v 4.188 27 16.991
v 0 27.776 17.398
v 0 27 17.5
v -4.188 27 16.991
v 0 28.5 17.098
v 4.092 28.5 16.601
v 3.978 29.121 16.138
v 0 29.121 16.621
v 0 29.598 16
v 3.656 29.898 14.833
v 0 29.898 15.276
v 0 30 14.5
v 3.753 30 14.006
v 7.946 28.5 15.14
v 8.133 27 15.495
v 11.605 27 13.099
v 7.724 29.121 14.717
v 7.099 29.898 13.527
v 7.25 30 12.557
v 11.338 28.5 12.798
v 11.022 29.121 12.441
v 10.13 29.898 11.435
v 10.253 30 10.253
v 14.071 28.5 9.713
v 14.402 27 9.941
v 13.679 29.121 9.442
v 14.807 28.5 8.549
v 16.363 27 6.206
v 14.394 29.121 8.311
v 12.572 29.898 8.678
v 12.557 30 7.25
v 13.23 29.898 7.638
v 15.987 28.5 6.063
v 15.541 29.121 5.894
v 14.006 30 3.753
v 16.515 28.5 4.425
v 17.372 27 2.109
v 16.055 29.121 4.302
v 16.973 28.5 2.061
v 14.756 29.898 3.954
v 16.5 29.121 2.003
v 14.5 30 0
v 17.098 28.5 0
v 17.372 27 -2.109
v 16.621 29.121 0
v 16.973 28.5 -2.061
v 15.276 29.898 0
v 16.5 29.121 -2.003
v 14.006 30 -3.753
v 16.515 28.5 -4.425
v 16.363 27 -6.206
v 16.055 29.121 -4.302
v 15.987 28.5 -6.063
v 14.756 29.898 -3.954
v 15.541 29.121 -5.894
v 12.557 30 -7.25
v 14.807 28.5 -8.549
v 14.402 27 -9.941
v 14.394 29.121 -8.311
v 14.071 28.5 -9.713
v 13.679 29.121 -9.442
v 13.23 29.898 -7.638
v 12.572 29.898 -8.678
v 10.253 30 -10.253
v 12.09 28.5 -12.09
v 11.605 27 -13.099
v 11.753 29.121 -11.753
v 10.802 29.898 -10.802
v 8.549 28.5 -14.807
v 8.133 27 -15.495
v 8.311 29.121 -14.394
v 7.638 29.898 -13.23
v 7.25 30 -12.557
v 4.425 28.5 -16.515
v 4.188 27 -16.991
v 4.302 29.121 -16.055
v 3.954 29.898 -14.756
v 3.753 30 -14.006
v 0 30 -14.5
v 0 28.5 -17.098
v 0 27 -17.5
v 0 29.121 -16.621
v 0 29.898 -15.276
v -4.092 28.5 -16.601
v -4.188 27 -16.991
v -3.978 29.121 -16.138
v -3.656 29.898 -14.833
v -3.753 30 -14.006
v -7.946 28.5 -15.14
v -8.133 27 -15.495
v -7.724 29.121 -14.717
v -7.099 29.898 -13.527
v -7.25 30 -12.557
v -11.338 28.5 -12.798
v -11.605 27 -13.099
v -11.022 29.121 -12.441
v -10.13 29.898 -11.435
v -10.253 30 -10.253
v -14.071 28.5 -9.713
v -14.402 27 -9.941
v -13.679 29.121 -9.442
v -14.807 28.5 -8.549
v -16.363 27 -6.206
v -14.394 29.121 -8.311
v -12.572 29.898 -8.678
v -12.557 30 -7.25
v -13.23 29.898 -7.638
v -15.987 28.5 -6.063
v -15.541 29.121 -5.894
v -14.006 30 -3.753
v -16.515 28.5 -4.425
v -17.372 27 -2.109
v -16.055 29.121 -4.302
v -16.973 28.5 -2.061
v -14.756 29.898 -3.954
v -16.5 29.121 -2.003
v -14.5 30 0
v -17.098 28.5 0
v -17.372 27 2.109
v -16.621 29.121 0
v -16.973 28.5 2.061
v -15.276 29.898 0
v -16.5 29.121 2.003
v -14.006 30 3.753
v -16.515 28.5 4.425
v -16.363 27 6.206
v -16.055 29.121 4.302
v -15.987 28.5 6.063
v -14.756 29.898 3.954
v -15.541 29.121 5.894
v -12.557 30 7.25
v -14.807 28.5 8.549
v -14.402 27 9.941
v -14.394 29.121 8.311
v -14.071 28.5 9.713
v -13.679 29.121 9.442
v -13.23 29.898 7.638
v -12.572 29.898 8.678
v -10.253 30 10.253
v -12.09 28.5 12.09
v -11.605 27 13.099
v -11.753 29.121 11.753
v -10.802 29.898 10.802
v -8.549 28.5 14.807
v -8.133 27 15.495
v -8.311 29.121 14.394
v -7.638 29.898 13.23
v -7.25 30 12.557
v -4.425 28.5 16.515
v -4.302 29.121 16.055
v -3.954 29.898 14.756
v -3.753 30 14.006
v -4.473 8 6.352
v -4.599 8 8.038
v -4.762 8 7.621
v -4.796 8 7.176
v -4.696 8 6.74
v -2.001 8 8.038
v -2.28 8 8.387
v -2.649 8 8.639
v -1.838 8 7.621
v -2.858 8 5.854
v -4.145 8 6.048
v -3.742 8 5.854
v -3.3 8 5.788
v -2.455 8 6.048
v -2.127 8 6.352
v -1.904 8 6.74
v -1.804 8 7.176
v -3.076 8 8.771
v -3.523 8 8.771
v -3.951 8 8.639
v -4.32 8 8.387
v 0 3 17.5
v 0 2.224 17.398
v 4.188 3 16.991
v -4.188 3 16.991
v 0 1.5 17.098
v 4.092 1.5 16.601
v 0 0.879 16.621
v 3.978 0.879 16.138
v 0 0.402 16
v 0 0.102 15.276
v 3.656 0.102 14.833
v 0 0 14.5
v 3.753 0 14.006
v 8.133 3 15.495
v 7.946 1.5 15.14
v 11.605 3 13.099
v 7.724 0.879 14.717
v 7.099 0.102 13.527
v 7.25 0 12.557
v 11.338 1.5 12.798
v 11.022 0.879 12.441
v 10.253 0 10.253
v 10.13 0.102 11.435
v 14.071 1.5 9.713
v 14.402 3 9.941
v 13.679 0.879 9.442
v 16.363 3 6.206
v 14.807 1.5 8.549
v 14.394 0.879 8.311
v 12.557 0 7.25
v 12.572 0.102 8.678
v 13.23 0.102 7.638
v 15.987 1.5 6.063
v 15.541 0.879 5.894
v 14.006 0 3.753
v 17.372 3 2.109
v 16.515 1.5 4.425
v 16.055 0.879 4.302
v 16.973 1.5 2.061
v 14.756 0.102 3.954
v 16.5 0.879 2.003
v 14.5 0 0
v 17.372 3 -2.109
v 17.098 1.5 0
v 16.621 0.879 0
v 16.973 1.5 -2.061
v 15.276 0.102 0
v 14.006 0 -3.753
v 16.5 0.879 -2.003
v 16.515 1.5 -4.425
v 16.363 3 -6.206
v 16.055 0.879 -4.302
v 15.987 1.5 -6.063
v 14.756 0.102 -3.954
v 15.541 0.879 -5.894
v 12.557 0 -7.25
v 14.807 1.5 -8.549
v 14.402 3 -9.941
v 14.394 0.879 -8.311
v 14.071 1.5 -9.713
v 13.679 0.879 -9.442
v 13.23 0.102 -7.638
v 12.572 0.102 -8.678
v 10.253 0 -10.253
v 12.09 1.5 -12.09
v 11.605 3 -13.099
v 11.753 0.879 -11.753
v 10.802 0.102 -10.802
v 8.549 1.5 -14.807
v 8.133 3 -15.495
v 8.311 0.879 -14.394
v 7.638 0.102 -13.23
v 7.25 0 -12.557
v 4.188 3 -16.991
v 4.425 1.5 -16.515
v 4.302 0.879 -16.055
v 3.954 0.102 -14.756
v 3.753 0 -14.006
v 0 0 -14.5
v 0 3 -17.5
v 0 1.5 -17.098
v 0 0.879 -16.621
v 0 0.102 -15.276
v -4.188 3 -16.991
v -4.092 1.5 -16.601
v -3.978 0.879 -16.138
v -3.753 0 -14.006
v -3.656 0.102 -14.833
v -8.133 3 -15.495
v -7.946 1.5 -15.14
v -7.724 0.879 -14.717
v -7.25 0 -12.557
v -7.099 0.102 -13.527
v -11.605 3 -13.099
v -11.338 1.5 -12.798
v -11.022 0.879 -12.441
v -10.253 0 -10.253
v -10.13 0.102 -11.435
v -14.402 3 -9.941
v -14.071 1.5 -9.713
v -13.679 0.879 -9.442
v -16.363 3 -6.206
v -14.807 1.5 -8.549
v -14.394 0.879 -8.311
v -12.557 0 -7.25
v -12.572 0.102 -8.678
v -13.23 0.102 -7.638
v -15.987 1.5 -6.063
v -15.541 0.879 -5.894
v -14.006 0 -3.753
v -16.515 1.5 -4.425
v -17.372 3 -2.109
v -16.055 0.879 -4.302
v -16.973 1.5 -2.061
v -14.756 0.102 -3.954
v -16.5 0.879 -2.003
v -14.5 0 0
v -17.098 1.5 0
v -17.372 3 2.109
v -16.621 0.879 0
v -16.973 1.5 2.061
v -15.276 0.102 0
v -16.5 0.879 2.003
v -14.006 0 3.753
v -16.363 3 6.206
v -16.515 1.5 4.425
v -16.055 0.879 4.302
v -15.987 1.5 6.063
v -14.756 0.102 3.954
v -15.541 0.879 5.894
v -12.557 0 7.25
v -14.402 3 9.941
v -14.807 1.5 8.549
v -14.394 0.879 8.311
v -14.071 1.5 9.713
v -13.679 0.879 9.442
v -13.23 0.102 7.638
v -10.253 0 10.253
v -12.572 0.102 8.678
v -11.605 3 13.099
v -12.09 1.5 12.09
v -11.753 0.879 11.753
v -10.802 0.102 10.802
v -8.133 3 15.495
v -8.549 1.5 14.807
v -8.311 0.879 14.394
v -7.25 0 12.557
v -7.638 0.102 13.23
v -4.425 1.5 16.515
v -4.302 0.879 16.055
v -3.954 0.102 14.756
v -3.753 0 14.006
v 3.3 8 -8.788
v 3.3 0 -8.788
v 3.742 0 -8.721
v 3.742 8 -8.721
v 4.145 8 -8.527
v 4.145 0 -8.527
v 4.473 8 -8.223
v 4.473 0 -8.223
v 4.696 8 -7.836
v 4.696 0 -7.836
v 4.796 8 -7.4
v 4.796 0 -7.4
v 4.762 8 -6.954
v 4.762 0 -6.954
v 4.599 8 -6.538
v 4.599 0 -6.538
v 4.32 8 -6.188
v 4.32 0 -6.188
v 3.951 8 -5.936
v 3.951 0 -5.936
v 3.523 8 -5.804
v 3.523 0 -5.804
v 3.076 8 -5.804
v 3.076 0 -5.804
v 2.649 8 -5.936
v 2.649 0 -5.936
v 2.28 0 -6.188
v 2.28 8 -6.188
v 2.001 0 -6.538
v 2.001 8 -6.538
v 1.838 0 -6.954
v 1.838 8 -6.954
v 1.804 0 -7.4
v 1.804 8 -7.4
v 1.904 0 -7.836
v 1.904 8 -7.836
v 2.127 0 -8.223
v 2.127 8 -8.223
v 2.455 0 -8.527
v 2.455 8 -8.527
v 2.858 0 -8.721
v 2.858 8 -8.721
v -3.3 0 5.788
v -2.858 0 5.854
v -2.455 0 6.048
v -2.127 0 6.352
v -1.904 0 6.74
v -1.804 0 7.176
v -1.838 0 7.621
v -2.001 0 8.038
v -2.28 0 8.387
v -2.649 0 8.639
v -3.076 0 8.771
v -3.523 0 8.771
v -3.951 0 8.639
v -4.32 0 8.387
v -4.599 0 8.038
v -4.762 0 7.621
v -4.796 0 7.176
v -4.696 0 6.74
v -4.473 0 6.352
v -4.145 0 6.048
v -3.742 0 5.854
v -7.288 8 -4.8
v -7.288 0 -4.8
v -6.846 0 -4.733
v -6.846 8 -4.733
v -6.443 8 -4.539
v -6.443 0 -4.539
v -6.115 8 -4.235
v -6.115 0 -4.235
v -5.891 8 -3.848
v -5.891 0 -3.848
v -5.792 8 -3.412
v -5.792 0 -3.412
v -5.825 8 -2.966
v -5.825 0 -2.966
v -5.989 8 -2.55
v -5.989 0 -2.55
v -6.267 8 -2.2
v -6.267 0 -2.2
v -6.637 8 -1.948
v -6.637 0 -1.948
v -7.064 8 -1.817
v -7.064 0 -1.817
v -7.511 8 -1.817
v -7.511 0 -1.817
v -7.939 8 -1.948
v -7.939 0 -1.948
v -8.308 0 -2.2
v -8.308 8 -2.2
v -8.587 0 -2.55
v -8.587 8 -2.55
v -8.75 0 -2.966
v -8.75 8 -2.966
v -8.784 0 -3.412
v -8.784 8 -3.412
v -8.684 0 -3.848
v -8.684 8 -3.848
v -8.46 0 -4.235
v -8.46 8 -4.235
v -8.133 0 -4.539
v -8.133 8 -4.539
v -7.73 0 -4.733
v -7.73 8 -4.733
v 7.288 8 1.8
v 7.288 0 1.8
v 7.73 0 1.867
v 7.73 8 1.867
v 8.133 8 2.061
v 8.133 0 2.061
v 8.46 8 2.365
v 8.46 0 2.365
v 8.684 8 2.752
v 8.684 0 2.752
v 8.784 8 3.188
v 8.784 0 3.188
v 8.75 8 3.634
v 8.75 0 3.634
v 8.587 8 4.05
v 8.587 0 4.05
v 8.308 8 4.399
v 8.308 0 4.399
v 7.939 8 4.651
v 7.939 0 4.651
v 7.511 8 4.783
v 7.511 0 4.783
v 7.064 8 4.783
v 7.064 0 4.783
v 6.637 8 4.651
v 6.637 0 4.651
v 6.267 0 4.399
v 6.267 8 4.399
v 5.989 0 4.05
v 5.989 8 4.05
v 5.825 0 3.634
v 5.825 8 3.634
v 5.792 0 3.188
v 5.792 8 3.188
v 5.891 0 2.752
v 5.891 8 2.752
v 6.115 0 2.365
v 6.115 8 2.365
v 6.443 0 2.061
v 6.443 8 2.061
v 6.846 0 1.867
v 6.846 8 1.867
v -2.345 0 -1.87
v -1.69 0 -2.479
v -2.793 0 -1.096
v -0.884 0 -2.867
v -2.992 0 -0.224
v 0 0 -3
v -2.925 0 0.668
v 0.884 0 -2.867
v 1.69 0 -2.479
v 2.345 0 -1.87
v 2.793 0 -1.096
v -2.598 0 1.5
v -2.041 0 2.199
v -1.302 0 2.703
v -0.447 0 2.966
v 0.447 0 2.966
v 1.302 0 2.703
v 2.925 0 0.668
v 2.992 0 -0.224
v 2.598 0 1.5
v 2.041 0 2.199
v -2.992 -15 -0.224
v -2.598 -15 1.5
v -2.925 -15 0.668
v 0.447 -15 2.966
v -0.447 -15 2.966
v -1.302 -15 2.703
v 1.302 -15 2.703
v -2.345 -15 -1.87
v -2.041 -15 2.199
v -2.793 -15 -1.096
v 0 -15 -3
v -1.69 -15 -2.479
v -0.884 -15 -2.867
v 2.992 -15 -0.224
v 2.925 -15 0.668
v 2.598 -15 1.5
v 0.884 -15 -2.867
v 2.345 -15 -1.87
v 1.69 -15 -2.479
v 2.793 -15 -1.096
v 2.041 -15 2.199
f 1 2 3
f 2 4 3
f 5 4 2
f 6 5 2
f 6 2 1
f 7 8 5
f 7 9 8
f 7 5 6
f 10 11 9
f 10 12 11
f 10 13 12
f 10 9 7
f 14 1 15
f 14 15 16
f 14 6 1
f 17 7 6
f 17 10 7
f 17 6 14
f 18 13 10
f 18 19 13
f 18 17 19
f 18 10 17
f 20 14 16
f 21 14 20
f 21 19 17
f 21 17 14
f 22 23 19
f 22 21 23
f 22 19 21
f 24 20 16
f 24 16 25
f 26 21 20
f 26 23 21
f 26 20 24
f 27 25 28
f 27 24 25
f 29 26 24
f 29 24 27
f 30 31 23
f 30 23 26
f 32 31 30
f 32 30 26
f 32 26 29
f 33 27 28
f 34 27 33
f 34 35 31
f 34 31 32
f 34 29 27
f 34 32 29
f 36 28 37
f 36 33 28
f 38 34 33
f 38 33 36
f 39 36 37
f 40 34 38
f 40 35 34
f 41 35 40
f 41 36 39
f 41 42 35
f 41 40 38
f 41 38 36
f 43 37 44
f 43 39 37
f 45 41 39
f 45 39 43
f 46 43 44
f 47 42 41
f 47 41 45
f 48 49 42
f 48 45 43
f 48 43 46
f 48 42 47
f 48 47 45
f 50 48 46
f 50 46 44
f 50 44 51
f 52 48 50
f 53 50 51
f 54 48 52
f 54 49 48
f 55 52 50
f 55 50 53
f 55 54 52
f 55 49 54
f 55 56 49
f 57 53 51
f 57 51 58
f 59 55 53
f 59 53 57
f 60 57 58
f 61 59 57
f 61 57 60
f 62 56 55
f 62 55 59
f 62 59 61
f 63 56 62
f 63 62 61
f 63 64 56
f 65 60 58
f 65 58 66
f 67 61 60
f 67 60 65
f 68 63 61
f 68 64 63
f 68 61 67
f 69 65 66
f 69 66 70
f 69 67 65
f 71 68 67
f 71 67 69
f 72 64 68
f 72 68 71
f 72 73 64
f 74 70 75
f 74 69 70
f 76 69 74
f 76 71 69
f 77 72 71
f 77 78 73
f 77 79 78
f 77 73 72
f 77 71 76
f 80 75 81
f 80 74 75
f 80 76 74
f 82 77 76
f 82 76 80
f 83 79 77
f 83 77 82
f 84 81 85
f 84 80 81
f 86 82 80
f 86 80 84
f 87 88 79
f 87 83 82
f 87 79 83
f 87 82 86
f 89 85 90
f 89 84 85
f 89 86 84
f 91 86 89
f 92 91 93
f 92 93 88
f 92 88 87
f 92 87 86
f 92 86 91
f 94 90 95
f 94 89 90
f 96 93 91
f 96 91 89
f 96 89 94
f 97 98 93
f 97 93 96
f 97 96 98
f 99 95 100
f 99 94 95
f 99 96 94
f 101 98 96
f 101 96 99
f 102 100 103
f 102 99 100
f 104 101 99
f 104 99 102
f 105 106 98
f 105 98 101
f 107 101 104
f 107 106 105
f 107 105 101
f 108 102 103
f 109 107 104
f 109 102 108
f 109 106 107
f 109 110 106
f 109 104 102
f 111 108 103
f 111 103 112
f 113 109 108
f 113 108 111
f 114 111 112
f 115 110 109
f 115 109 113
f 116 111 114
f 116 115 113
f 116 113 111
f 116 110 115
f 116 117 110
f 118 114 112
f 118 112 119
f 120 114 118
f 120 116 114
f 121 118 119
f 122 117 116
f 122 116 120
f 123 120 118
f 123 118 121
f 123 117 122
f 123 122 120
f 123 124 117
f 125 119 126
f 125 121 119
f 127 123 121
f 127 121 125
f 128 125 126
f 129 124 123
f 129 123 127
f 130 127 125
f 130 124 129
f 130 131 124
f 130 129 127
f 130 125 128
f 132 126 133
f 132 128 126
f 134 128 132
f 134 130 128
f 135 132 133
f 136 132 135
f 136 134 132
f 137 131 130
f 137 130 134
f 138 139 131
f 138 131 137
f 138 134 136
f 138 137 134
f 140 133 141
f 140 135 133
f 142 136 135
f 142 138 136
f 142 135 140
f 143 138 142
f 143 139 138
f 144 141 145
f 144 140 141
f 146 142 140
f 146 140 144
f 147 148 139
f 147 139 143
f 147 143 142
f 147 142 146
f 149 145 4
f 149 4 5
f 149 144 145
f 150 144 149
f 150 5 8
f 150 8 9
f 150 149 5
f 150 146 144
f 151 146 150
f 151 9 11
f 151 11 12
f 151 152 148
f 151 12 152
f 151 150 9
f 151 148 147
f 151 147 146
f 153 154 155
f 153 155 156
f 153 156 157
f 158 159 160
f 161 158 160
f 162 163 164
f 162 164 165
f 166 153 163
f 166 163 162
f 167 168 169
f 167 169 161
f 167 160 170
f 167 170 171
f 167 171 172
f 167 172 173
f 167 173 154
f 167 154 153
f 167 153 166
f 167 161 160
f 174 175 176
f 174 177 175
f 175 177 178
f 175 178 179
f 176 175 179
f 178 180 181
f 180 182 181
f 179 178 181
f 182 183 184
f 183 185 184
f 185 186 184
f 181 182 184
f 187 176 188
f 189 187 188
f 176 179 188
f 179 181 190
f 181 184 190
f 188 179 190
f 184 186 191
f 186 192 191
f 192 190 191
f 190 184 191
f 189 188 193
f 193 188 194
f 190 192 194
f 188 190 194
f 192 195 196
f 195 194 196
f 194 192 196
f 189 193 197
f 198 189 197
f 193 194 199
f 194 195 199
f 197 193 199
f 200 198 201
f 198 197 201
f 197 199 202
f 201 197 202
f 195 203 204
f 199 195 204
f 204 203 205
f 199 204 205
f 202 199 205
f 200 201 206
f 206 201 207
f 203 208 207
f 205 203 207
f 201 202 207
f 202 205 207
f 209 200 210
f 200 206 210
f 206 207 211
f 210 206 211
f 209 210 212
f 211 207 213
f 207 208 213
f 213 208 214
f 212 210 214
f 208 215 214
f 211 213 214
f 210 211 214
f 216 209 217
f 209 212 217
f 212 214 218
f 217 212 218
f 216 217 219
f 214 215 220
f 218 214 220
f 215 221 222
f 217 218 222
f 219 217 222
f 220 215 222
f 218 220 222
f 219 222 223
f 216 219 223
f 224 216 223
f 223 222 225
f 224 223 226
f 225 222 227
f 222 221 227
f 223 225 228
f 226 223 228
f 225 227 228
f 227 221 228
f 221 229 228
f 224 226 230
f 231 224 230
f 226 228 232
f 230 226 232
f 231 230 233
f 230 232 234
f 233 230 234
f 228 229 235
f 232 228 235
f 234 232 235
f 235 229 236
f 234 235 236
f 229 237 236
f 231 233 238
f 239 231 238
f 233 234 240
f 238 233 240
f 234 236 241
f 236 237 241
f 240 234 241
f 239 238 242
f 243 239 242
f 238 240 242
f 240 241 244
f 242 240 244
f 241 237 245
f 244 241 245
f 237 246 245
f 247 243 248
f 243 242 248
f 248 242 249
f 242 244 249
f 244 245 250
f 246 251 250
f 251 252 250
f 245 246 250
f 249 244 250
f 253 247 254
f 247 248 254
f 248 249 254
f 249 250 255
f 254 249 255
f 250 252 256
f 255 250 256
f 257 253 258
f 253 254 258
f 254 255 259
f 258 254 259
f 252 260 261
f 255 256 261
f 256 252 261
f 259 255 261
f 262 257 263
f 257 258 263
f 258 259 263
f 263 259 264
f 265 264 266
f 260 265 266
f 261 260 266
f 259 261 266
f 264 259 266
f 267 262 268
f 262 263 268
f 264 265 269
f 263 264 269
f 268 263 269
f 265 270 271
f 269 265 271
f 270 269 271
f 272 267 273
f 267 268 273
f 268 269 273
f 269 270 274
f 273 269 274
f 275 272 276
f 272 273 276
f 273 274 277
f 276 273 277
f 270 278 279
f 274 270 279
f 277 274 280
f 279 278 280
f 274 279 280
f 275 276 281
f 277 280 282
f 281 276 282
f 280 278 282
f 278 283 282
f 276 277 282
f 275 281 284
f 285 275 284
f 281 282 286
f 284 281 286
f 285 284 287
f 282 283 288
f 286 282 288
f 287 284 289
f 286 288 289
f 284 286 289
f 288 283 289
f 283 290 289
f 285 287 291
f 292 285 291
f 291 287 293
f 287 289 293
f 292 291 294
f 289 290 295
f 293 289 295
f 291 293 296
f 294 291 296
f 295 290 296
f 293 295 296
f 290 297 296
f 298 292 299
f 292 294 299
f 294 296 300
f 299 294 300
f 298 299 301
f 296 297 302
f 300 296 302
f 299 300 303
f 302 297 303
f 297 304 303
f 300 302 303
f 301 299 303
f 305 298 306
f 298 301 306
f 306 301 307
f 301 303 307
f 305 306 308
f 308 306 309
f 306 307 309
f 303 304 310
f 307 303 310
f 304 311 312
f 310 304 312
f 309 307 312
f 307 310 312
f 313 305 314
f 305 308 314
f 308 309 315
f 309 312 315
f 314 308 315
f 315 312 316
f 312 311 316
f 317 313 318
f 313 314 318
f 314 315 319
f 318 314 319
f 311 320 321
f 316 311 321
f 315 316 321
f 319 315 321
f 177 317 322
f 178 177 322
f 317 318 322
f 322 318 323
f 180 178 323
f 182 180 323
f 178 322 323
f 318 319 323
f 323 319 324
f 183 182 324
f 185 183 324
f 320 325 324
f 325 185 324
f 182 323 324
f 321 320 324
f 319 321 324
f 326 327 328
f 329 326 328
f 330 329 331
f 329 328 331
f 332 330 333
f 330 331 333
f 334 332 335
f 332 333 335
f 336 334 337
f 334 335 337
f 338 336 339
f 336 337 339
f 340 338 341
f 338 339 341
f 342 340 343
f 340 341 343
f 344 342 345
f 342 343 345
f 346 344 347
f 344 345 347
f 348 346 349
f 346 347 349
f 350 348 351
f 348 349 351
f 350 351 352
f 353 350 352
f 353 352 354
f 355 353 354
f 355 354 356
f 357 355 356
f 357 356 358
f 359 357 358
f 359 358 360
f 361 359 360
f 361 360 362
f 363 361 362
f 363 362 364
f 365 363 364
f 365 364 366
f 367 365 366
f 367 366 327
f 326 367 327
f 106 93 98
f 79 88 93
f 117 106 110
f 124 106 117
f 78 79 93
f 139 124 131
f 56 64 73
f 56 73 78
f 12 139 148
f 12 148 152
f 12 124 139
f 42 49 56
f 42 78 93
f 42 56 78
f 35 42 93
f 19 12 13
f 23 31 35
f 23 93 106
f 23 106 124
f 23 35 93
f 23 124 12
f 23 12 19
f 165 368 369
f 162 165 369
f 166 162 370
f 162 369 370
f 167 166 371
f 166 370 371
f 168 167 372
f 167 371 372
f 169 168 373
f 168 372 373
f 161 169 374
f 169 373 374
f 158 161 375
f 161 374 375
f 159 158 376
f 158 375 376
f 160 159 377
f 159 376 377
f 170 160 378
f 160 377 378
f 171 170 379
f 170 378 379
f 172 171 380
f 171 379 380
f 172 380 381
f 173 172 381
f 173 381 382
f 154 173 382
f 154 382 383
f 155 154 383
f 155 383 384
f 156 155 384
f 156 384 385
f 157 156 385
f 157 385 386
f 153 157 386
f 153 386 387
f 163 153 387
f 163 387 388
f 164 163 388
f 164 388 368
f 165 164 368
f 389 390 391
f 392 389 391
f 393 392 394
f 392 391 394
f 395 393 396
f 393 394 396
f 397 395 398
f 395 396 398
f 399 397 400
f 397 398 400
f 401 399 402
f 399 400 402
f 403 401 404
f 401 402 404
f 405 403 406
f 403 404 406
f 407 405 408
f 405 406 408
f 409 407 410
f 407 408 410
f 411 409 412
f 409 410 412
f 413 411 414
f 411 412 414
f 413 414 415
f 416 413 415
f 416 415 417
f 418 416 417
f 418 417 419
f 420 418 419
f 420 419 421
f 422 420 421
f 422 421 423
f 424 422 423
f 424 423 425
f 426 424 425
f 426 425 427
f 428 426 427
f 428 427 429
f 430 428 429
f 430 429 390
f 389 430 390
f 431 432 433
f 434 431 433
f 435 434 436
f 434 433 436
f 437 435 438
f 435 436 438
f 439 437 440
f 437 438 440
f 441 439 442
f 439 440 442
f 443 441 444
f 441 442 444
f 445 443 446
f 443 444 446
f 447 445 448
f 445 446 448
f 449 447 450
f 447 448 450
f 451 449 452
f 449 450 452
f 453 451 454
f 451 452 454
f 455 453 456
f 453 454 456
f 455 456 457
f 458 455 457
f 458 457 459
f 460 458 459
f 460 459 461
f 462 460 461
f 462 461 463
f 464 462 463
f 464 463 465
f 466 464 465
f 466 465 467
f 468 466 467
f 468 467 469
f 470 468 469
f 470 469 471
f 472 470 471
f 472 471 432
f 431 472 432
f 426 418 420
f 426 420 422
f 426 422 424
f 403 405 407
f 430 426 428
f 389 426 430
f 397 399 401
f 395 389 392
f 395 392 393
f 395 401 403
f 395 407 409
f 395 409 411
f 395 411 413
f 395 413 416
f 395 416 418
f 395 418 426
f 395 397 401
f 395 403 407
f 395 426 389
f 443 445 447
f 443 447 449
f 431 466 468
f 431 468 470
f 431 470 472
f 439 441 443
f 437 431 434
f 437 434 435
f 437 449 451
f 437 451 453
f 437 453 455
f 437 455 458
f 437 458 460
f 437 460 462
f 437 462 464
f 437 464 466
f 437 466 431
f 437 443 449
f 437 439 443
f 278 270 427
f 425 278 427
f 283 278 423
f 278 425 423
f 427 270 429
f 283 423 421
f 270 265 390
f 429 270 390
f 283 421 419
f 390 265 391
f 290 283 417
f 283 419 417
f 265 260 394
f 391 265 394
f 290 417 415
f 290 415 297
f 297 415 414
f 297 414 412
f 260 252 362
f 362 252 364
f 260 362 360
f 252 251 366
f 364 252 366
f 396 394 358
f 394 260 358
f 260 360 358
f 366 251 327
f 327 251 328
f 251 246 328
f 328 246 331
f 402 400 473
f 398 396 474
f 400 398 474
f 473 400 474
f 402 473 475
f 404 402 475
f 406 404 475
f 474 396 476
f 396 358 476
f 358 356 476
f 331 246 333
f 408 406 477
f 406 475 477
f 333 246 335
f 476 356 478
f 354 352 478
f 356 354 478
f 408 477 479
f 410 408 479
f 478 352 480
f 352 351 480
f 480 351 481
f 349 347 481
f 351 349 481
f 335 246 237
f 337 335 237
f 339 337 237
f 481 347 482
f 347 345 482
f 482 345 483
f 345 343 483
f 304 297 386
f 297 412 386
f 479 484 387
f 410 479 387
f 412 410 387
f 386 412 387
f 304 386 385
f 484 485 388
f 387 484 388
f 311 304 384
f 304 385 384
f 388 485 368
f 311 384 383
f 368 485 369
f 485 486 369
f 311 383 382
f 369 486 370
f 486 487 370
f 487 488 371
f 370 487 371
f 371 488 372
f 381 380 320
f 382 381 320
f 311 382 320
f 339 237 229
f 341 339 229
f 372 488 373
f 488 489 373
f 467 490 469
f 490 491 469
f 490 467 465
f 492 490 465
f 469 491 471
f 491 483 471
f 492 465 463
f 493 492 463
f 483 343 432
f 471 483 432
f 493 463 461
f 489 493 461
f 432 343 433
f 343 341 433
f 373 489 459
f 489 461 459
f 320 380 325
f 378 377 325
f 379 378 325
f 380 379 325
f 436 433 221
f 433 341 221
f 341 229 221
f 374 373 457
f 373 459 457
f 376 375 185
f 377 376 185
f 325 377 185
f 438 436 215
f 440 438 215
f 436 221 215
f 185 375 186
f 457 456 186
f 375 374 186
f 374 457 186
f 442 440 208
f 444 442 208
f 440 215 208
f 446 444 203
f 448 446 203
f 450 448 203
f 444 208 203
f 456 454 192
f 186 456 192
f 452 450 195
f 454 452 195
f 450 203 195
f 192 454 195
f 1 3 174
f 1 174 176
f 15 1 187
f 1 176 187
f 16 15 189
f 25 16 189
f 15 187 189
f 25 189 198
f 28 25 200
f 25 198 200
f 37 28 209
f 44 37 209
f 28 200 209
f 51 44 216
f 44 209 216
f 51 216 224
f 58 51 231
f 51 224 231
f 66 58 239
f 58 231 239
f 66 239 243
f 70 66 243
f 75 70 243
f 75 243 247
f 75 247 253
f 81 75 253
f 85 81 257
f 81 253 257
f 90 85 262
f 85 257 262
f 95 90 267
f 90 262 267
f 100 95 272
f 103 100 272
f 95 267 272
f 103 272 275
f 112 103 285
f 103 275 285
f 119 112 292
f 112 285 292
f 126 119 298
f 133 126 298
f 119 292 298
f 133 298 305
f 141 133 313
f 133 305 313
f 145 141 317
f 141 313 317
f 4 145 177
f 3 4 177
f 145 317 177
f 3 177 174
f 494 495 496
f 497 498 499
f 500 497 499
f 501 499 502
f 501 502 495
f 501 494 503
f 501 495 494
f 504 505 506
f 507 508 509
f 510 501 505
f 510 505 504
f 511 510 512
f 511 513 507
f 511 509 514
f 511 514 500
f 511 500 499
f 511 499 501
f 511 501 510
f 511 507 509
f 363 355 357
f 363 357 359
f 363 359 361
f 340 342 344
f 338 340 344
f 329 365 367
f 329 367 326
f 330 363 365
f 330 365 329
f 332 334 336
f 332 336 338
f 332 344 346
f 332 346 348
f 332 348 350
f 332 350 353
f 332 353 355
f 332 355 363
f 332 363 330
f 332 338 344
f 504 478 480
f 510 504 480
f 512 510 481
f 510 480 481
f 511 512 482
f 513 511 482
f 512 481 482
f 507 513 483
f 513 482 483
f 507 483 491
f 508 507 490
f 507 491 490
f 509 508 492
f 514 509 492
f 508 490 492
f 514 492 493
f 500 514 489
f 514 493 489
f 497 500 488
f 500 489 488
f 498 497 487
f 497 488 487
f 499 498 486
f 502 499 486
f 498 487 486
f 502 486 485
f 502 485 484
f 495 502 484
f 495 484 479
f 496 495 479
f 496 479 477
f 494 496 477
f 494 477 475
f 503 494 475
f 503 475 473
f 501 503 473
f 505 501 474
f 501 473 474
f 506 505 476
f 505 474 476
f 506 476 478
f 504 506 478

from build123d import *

# Parameters (mm, degrees)
SKETCH_1_R          = 17.5
EXTRUDE_1_DEPTH     = 30
SKETCH_2_R          = 3
EXTRUDE_2_DEPTH     = 15
FILLET_1_R          = 3
SKETCH_3_R          = 1.5
CUT_EXTRUDE_1_DEPTH = 10


with BuildPart() as part:
    # 草图1 → 凸台-拉伸1 (new body)
    with BuildSketch(Plane(origin=(0, 0, 0), x_dir=(1, 0, 0), z_dir=(0, 1, 0))):
        with Locations(Location((0, 0, 0), (0, 0, 270))):
            Circle(SKETCH_1_R)
    extrude(amount=EXTRUDE_1_DEPTH)

    # 草图2 → 凸台-拉伸2 (add)
    with BuildSketch(Plane(origin=(0, 0, 0), x_dir=(-1, 0, 0), z_dir=(0, -1, 0))):
        with Locations(Location((0, 0, 0), (0, 0, 90))):
            Circle(SKETCH_2_R)
    extrude(amount=EXTRUDE_2_DEPTH)

    # 圆角1
    fillet_1_edges = [part.edges().sort_by_distance(p)[0] for p in [
        (0, 0, -17.5),
        (0, 30, -17.5),
    ]]
    fillet(fillet_1_edges, radius=FILLET_1_R)

    # 草图3 → 切除-拉伸1 (cut)
    with BuildSketch(Plane(origin=(929.367009244, -2, 420.329827188), x_dir=(-0.9109625982496437, 0, -0.41248896299205207), z_dir=(0, -1, 0))):
        with Locations(Location((1012, -0.448882386, 0), (0, 0, 65.638716244))):
            Circle(SKETCH_3_R)
        with Locations(Location((1020, 7.551117614, 0), (0, 0, 65.638716244))):
            Circle(SKETCH_3_R)
        with Locations(Location((1028, -0.448882386, 0), (0, 0, 65.638716244))):
            Circle(SKETCH_3_R)
        with Locations(Location((1020, -8.448882386, 0), (0, 0, 65.638716244))):
            Circle(SKETCH_3_R)
    extrude(amount=-CUT_EXTRUDE_1_DEPTH, mode=Mode.SUBTRACT)


solid = part.part
